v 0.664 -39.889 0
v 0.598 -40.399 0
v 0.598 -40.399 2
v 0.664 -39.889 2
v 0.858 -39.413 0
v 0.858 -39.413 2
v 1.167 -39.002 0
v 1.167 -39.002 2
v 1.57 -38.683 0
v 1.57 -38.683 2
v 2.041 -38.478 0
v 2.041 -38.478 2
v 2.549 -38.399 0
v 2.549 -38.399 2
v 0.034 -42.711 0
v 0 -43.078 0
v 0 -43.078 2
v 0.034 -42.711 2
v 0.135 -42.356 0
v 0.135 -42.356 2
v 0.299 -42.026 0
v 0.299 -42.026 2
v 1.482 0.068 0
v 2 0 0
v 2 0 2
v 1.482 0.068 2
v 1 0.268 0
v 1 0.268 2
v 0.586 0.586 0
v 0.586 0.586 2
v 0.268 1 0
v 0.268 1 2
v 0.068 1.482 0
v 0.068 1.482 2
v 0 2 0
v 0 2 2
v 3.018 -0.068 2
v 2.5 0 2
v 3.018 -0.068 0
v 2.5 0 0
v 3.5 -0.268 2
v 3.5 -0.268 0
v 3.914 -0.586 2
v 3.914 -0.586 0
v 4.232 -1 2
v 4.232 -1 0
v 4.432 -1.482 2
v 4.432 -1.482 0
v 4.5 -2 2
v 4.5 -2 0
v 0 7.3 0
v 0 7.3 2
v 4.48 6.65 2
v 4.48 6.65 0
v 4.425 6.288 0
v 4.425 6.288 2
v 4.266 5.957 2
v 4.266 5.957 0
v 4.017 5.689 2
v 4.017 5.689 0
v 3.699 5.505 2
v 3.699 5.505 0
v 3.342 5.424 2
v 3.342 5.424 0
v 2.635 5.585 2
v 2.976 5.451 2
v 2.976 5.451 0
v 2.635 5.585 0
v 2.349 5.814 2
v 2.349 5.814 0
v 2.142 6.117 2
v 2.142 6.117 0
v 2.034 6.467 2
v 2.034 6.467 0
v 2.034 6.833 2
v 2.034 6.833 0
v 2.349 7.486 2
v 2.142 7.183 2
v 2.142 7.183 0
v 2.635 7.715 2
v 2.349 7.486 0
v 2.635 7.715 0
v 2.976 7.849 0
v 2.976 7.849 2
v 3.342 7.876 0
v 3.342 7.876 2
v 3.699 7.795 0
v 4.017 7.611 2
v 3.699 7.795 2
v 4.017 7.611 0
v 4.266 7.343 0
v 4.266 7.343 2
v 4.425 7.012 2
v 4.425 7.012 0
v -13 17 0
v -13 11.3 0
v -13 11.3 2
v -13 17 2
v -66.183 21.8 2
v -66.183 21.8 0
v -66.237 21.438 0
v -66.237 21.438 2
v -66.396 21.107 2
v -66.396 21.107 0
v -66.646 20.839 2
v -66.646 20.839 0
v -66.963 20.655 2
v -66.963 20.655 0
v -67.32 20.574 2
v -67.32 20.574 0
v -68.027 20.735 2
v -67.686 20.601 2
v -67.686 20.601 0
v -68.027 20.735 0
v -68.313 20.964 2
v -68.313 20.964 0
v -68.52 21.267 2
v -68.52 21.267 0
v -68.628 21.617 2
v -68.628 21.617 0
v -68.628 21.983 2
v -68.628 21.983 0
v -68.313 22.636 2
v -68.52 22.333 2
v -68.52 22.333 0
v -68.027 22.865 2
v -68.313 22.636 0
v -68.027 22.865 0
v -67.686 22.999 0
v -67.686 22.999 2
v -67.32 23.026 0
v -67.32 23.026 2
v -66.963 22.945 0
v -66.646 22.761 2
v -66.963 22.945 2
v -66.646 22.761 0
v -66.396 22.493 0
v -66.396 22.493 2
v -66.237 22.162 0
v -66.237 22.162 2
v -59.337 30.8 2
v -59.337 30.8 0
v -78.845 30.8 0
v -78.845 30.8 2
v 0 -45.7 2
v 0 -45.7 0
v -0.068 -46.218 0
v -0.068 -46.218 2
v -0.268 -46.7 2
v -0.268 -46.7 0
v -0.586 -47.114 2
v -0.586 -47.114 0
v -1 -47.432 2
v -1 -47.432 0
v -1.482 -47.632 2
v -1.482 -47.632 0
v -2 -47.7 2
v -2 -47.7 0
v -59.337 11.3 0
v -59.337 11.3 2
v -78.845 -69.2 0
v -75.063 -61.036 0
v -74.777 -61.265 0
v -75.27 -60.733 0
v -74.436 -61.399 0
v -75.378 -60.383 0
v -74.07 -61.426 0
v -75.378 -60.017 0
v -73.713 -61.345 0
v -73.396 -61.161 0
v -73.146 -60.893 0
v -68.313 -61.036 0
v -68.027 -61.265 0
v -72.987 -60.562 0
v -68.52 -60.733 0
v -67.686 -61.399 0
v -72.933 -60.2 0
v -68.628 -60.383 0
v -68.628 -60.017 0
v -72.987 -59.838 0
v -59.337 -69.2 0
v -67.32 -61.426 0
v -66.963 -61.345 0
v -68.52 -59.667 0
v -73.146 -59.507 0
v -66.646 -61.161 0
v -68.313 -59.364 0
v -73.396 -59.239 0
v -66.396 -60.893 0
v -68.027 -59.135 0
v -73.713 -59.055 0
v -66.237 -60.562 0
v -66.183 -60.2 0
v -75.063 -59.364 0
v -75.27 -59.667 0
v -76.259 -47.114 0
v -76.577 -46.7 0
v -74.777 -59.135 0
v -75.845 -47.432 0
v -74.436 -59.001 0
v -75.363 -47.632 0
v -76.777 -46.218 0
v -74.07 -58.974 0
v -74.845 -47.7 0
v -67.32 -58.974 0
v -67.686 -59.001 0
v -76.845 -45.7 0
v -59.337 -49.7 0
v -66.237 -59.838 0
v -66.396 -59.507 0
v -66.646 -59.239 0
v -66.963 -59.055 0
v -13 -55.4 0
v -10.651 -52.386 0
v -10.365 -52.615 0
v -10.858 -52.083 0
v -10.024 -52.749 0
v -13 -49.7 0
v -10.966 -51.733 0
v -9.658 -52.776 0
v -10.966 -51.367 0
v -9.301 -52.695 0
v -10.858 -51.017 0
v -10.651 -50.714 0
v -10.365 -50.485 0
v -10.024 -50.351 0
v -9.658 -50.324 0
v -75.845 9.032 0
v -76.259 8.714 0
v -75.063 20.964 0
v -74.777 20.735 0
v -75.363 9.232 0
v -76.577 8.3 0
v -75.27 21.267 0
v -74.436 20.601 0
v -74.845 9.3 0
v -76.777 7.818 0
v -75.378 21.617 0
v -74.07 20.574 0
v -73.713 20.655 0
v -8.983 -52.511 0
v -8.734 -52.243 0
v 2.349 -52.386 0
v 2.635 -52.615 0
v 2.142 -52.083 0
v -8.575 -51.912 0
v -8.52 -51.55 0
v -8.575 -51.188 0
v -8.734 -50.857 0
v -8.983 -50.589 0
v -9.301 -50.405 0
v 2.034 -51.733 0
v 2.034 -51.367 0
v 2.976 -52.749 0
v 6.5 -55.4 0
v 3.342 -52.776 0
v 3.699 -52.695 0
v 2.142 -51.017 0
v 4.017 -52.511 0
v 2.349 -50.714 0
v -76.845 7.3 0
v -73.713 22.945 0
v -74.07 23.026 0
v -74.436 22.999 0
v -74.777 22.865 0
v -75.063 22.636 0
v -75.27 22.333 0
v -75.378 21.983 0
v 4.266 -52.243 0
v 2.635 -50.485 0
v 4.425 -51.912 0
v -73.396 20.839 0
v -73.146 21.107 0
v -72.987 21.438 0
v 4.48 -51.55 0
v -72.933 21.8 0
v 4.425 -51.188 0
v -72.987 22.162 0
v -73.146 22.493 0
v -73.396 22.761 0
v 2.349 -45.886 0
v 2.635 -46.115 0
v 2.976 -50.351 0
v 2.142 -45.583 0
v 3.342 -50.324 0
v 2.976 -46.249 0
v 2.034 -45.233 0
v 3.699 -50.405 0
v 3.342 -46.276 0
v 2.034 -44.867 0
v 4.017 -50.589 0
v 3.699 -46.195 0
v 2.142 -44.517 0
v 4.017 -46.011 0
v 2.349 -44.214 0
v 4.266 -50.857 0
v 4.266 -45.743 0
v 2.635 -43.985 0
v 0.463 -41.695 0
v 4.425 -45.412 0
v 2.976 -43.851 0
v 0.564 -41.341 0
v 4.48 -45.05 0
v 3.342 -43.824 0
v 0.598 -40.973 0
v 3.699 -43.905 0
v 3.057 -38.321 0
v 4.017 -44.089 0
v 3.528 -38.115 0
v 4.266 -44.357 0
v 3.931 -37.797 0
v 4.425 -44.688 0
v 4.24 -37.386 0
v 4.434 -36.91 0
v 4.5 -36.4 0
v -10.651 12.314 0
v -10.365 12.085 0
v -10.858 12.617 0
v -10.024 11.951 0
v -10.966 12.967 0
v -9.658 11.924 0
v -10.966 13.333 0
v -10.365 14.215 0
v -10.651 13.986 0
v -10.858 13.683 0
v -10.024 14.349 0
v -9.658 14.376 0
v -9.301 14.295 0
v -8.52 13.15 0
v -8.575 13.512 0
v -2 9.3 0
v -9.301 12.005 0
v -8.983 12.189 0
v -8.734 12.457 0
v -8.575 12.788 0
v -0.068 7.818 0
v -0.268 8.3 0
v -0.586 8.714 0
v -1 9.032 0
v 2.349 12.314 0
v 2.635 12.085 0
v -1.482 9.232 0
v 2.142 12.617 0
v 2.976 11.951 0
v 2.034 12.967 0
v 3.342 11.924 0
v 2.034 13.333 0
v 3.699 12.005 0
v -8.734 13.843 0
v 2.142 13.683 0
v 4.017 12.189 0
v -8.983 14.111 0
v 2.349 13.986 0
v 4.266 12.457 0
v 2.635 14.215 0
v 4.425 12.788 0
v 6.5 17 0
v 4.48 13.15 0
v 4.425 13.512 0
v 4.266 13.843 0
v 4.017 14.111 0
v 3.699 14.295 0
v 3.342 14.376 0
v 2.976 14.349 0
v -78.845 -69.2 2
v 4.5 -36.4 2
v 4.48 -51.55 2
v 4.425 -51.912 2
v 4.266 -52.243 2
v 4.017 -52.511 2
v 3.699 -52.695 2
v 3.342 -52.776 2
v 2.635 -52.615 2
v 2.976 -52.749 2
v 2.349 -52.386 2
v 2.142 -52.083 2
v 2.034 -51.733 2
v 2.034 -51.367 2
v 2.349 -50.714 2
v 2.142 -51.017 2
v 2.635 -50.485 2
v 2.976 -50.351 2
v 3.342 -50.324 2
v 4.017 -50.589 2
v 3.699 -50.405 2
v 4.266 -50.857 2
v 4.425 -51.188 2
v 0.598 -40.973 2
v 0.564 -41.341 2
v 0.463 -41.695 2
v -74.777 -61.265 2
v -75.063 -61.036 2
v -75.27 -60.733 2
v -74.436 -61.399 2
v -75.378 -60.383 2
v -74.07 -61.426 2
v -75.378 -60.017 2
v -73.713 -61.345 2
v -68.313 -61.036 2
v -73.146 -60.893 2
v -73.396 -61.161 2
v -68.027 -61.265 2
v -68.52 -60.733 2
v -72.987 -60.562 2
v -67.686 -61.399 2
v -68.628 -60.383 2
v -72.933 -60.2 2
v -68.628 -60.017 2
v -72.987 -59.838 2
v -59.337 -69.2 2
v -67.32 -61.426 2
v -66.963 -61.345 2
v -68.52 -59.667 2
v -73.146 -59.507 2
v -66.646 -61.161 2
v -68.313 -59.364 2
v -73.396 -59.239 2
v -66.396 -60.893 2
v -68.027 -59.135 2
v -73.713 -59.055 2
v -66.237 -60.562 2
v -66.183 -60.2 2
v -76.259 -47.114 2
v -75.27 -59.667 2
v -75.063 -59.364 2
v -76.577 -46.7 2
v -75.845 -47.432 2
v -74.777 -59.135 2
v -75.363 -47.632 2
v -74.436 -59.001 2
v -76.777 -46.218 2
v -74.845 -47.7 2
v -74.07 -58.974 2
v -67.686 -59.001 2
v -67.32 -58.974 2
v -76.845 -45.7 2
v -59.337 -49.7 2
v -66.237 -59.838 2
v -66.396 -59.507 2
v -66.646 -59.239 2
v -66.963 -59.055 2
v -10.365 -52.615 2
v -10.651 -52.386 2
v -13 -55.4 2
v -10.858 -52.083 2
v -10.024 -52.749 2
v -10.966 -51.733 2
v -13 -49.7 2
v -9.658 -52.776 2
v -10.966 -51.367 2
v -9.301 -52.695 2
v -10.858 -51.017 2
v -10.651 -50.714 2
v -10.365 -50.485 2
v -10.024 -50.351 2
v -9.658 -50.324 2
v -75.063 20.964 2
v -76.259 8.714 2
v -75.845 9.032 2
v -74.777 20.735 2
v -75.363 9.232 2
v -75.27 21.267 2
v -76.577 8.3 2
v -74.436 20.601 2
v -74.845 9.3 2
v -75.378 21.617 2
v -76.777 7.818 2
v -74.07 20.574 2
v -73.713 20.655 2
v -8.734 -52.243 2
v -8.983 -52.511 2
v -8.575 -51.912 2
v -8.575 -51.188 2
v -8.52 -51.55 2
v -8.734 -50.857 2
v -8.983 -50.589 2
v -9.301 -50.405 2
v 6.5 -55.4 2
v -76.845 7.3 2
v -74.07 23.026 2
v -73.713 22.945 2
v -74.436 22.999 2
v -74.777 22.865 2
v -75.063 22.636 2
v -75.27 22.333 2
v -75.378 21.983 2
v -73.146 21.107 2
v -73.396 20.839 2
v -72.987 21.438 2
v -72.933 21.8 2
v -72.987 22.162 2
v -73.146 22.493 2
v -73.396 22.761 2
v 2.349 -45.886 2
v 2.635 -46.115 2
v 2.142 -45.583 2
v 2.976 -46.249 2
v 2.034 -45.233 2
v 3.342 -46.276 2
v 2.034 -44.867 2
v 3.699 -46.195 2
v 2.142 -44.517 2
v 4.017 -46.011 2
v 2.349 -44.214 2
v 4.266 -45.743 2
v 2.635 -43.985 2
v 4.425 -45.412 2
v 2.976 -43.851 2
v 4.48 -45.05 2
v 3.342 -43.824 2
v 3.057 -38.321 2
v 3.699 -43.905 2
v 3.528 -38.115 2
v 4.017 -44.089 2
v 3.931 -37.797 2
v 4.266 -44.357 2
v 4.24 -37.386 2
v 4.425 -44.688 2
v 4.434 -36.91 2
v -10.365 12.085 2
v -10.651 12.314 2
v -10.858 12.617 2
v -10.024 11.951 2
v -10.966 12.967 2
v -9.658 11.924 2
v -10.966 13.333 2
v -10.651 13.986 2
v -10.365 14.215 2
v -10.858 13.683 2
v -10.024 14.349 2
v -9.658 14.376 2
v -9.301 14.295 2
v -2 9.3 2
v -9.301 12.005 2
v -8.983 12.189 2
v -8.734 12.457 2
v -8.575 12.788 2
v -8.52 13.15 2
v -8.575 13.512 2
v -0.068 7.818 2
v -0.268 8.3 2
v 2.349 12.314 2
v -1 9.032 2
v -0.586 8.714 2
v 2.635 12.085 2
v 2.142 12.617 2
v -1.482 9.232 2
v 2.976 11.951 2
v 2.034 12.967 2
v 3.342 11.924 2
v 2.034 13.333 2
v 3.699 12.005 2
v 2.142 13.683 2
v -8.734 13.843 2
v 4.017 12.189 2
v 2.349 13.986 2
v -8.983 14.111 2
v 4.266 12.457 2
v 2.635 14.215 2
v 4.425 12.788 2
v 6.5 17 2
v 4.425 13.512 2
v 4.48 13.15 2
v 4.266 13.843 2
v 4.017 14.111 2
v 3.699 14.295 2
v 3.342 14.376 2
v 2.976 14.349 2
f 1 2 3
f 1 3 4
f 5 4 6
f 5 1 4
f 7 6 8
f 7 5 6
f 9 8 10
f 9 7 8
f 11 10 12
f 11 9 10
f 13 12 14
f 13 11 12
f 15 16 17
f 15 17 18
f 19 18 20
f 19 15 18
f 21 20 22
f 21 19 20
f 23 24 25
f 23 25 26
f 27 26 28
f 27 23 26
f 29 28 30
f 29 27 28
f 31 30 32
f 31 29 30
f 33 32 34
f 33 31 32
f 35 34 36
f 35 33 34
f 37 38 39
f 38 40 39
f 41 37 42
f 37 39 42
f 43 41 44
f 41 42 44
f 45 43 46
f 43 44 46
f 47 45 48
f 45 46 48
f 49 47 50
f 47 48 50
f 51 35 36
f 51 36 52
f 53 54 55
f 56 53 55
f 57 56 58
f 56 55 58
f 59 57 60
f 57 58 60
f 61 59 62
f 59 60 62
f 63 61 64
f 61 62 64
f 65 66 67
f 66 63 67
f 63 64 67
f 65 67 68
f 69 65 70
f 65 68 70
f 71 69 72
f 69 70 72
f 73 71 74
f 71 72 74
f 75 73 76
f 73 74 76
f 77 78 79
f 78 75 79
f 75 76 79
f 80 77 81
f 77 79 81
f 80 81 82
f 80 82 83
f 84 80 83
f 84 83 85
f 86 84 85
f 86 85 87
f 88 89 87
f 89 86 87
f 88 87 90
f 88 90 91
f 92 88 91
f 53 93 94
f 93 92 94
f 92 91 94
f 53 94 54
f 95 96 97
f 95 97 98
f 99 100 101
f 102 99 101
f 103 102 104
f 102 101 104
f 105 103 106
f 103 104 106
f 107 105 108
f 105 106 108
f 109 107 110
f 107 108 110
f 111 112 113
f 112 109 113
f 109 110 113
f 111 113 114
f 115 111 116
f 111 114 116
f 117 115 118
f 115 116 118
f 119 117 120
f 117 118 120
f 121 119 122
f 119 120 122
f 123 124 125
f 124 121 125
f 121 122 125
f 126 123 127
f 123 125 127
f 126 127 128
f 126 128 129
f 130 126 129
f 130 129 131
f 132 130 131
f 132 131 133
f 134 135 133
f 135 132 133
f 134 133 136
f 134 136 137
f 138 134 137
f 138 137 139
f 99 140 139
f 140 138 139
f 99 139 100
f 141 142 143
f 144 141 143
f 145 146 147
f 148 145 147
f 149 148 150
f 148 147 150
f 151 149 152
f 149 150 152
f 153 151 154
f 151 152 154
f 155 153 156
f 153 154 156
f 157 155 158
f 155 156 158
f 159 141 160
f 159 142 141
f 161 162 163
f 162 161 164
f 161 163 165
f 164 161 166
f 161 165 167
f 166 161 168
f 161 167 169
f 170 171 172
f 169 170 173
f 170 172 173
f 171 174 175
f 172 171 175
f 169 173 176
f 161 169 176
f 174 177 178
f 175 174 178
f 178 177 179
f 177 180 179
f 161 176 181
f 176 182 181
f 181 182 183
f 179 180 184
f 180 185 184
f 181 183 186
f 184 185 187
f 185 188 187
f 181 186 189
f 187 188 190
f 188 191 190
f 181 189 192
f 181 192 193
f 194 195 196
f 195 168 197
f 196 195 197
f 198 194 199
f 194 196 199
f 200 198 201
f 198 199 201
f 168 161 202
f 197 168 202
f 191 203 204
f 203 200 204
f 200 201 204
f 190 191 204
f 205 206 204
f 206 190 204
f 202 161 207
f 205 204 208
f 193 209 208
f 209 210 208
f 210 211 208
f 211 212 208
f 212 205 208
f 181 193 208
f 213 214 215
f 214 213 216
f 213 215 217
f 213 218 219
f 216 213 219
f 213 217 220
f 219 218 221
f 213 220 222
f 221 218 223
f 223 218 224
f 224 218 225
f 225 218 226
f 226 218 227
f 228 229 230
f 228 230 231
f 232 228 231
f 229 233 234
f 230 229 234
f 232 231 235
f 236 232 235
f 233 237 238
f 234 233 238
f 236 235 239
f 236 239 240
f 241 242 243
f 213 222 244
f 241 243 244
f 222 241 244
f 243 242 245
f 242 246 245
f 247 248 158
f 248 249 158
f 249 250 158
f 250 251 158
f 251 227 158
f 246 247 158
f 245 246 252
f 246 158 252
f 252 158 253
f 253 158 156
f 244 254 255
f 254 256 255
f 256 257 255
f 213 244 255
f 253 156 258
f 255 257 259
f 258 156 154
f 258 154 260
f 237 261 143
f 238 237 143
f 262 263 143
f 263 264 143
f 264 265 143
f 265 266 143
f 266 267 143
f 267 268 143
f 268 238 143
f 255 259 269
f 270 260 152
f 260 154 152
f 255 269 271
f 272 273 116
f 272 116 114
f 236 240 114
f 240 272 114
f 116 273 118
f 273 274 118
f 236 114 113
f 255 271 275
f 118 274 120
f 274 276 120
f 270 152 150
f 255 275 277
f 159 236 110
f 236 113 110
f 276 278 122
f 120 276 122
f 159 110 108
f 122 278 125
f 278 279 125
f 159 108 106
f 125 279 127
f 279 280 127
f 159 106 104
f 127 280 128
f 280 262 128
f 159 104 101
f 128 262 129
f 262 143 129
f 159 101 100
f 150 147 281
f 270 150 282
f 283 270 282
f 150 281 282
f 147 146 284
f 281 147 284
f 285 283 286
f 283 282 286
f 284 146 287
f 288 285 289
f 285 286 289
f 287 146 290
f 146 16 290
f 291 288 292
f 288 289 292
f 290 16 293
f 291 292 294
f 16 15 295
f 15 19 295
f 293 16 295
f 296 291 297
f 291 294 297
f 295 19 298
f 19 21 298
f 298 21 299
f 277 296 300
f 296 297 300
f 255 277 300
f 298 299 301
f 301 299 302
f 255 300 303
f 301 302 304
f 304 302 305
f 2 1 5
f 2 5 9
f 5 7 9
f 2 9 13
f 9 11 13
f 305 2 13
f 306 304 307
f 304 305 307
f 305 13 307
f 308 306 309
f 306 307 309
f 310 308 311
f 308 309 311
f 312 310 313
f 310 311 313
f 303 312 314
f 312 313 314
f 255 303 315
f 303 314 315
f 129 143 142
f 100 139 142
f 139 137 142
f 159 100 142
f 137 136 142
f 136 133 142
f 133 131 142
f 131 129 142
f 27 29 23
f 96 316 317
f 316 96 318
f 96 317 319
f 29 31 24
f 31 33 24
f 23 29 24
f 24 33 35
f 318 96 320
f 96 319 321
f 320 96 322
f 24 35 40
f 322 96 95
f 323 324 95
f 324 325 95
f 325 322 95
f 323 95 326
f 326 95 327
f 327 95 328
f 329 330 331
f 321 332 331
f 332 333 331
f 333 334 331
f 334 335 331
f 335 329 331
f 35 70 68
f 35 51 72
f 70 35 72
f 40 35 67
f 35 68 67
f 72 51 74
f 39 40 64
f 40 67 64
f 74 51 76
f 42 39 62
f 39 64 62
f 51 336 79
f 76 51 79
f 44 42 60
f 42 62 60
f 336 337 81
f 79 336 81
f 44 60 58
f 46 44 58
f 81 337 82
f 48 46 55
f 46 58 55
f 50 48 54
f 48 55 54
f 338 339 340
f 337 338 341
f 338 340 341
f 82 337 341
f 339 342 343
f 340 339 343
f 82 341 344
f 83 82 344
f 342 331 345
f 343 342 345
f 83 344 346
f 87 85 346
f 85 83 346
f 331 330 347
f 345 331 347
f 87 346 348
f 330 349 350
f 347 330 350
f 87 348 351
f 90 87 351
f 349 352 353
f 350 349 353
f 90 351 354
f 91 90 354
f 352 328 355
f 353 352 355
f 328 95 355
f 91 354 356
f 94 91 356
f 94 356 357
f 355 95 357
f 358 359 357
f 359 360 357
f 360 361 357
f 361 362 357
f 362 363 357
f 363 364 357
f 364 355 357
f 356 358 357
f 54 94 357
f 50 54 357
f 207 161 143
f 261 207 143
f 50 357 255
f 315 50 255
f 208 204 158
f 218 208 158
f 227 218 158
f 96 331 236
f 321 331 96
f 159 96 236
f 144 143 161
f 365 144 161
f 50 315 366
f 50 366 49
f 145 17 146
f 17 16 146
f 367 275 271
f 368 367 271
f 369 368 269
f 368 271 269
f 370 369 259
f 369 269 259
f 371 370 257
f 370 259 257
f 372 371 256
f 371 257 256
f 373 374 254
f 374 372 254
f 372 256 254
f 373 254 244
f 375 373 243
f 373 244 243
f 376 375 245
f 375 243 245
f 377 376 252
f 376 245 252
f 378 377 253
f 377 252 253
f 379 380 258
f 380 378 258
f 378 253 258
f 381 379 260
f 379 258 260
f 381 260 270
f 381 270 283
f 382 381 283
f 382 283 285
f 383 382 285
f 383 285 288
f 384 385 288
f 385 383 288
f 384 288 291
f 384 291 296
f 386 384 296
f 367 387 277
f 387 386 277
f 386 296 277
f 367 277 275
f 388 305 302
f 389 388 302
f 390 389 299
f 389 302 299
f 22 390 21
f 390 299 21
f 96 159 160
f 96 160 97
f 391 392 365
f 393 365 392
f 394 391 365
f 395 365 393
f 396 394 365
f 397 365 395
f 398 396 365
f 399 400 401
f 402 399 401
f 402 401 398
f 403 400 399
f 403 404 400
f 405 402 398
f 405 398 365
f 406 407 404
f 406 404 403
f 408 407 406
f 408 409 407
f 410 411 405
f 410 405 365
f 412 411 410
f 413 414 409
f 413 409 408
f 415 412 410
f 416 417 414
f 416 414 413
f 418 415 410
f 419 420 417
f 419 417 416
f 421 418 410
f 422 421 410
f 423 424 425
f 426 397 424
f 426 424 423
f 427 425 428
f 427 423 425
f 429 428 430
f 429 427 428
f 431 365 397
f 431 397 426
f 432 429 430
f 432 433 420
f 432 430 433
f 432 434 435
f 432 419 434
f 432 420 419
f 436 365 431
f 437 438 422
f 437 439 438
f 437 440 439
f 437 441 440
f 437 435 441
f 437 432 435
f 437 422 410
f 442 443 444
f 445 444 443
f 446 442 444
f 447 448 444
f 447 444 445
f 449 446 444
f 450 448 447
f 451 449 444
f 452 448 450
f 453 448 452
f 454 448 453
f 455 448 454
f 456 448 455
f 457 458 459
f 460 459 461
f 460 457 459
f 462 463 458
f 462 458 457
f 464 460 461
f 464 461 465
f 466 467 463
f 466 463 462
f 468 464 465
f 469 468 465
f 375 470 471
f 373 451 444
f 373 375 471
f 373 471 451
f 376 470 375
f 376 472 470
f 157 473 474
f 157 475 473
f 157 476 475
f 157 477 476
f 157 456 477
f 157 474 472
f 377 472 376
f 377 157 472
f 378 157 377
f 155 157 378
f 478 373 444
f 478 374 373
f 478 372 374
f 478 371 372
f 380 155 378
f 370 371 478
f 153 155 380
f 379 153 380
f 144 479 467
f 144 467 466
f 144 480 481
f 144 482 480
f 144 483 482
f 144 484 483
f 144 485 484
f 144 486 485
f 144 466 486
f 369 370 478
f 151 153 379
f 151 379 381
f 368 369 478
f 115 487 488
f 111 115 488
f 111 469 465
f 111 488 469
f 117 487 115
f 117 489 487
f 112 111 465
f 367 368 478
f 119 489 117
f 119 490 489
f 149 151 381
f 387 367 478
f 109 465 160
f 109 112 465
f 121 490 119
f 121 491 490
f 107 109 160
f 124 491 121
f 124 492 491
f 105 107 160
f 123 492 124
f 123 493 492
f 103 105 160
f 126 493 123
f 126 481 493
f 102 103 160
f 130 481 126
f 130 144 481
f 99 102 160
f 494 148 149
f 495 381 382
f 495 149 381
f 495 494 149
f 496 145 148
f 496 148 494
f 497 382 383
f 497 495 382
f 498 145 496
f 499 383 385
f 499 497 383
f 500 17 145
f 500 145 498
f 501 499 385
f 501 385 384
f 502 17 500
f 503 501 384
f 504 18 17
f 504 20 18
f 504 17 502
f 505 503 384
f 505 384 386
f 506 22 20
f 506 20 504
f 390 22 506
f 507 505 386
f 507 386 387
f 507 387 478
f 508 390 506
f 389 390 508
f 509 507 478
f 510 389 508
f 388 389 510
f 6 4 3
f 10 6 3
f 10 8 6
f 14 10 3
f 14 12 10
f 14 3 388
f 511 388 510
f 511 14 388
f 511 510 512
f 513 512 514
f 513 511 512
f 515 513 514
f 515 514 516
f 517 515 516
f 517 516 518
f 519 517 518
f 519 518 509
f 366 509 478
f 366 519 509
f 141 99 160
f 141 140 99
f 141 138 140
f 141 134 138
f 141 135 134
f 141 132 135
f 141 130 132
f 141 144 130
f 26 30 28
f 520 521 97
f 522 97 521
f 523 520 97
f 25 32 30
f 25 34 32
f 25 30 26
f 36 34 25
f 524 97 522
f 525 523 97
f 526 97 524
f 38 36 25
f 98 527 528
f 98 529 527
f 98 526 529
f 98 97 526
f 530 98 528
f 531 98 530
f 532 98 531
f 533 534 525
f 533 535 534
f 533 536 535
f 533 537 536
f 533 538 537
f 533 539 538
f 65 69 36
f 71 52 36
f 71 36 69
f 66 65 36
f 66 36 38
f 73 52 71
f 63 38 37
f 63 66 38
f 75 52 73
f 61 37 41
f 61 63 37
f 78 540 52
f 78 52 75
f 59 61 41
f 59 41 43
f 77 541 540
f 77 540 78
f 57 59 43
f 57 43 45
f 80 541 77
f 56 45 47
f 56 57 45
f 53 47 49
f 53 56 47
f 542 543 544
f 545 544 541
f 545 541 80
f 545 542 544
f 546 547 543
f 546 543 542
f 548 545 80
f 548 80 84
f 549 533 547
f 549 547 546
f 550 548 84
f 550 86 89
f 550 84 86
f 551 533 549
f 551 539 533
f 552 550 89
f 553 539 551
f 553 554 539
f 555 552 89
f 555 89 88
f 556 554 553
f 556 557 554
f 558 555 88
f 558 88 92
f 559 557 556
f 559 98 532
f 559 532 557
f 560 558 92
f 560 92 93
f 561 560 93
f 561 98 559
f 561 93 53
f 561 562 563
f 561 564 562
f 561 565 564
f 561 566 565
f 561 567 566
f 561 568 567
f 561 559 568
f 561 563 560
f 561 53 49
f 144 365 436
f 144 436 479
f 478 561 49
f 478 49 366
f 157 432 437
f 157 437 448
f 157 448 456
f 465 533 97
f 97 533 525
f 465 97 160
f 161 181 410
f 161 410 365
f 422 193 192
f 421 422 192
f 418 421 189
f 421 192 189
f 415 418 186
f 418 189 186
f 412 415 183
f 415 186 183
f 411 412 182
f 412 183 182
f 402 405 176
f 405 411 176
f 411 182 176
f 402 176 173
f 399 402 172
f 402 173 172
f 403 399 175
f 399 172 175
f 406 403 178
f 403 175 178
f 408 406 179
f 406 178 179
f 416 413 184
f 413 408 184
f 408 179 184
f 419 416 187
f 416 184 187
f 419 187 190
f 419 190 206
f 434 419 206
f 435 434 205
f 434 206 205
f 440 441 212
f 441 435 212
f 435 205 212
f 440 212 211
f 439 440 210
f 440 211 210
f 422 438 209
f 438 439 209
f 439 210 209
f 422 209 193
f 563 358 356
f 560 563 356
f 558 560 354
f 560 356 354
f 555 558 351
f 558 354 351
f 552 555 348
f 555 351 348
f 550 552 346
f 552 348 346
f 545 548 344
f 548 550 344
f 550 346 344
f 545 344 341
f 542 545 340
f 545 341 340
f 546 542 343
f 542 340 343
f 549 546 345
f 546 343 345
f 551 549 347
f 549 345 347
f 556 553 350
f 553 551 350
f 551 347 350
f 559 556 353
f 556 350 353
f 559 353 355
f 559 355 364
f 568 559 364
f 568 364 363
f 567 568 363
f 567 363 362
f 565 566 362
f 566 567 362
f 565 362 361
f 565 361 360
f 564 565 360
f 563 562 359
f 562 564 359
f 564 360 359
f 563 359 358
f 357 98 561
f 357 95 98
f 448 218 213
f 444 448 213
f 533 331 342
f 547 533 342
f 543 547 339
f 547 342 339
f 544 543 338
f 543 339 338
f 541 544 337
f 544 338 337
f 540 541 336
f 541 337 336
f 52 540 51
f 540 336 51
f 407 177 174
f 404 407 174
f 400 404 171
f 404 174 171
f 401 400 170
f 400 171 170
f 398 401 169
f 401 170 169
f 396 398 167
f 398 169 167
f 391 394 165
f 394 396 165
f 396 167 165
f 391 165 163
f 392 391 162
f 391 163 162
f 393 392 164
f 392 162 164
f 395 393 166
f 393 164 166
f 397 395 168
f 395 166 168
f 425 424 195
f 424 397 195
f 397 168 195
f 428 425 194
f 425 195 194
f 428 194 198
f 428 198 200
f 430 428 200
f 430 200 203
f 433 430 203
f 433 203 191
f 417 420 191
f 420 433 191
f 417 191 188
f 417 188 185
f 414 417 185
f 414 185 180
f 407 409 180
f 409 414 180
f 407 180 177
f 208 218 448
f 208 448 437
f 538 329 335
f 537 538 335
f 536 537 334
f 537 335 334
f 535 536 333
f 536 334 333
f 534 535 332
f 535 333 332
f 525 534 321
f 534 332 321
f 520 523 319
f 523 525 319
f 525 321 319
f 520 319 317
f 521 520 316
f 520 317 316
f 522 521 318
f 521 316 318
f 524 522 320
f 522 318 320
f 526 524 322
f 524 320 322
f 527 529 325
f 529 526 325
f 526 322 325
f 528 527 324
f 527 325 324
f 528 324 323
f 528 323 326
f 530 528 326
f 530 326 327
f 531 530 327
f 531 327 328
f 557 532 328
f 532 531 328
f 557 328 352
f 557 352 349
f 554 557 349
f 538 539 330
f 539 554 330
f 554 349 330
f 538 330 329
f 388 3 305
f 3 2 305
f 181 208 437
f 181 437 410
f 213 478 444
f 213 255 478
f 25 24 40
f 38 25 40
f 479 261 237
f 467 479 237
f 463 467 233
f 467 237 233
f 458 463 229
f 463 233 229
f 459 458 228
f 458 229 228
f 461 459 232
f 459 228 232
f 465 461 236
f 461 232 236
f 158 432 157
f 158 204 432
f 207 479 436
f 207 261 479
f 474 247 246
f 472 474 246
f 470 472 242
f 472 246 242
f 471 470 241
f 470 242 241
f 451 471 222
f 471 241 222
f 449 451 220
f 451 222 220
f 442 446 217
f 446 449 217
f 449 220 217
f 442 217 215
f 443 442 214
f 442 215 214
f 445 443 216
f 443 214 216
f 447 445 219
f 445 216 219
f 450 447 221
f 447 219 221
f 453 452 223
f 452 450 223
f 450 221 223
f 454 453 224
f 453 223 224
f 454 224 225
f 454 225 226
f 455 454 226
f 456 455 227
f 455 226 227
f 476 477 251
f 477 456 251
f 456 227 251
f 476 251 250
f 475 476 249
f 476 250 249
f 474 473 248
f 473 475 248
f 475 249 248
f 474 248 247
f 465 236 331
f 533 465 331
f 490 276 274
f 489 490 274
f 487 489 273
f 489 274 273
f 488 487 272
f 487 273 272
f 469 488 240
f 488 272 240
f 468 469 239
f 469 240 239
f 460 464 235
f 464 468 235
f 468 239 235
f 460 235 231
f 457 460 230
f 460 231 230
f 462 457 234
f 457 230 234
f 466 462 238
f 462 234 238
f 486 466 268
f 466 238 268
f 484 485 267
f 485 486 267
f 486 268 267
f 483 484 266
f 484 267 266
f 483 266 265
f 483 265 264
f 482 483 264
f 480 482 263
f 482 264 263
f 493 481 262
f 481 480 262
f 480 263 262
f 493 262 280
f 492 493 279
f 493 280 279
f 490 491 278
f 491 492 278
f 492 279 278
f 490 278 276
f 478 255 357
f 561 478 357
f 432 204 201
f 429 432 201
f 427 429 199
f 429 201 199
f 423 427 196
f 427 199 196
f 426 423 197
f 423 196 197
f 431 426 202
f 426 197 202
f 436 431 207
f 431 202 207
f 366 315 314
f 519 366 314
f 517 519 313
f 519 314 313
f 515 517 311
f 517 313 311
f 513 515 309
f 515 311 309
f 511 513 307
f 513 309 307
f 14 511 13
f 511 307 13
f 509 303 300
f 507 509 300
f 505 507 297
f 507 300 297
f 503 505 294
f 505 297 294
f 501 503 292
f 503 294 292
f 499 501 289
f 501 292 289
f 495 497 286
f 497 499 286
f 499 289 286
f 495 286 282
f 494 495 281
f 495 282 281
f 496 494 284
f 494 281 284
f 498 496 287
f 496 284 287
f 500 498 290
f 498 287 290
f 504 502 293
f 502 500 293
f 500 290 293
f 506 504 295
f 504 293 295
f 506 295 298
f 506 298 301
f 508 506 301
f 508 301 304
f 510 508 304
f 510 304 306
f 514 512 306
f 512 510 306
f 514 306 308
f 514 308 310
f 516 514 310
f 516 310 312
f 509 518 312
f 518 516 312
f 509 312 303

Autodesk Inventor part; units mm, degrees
ref_plane "YZ Plane" through (0, 0, 0) normal (1, 0, 0) x (0, 1, 0)
ref_plane "XZ Plane" through (0, 0, 0) normal (0, 1, 0) x (-1, 0, 0)
ref_plane "XY Plane" through (0, 0, 0) normal (0, 0, 1) x (1, 0, 0)
sketch "Sketch1" plane through (0, 0, 0) normal (0, 0, 1) x (1, 0, 0)
  circle A0 centre (3.25, 6.65) radius 1.2295 projected
  line L0 (0, 0) -> (6.5, 0) projected
  line L1 (6.5, 0) -> (6.5, 9.3) projected
  line L2 (6.5, 9.3) -> (0, 9.3) projected
  line L3 (0, 0) -> (0, 9.3) projected
  circle A1 centre (3.25, 13.15) radius 1.2295 projected
  line L4 (0, 9.3) -> (6.5, 9.3) projected
  line L5 (6.5, 9.3) -> (6.5, 17) projected
  line L6 (0, 17) -> (6.5, 17) projected
  line L7 (0, 9.3) -> (0, 17) projected
  circle A2 centre (3.25, -45.05) radius 1.2295 projected
  line L8 (0.5983, -42.4) -> (0, -42.4) projected
  line L9 (0, -42.4) -> (0, -47.7) projected
  line L10 (0, -47.7) -> (6.5, -47.7) projected
  line L11 (6.5, -38.4) -> (6.5, -47.7) projected
  line L12 (0.5983, -38.4) -> (6.5, -38.4) projected
  line L13 (0.5983, -38.4) -> (0.5983, -42.4) projected
  circle A3 centre (3.25, -51.55) radius 1.2295 projected
  line L14 (0, -47.7) -> (6.5, -47.7) projected
  line L15 (0, -47.7) -> (0, -55.4) projected
  line L16 (6.5, -55.4) -> (0, -55.4) projected
  line L17 (6.5, -47.7) -> (6.5, -55.4) projected
  circle A4 centre (-9.75, -51.55) radius 1.2295 projected
  line L18 (-41.3371, -47.7) -> (-6.5, -47.7) projected
  line L19 (-41.3371, -47.7) -> (-41.3371, -49.7) projected
  line L20 (-13, -49.7) -> (-41.3371, -49.7) projected
  line L21 (-13, -49.7) -> (-13, -55.4) projected
  line L22 (-6.5, -55.4) -> (-13, -55.4) projected
  line L23 (-6.5, -47.7) -> (-6.5, -55.4) projected
  circle A5 centre (-9.75, 13.15) radius 1.2295 projected
  line L24 (-41.3371, 11.3) -> (-13, 11.3) projected
  line L25 (-41.3371, 9.3) -> (-41.3371, 11.3) projected
  line L26 (-41.3371, 9.3) -> (-6.5, 9.3) projected
  line L27 (-6.5, 9.3) -> (-6.5, 17) projected
  line L28 (-13, 17) -> (-6.5, 17) projected
  line L29 (-13, 11.3) -> (-13, 17) projected
  arc A6 (-64.7971, 16.2257) -> (-64.1621, 16.7072) centre (-64.6621, 16.7072) ccw projected
  line L30 (-64.1621, 16.7072) -> (-64.1621, 23.8) projected
  arc A7 (-64.1621, 23.8) -> (-67.1621, 26.8) centre (-67.1621, 23.8) ccw projected
  line L31 (-67.1621, 26.8) -> (-70.1621, 26.8) projected
  line L32 (-70.1621, 26.8) -> (-70.1621, 29.3) projected
  line L33 (-70.1621, 29.3) -> (-59.3371, 29.3) projected
  line L34 (-59.3371, 29.3) -> (-59.3371, 30.8) projected
  line L35 (-59.3371, 30.8) -> (-78.8451, 30.8) projected
  line L36 (-78.8451, 16.3) -> (-78.8451, 30.8) projected
  line L37 (-65.3371, 16.3) -> (-78.8451, 16.3) projected
  arc A8 (-64.7971, 16.2257) -> (-65.3371, 16.3) centre (-65.3371, 14.3) ccw projected
  circle A9 centre (-67.4121, 21.8) radius 1.2295 projected
  circle A10 centre (-74.1621, 21.8) radius 1.2295 projected
  circle A11 centre (-67.4121, -60.2) radius 1.2295 projected
  circle A12 centre (-74.1621, -60.2) radius 1.2295 projected
  arc A13 (-64.1621, -55.1072) -> (-64.7971, -54.6257) centre (-64.6621, -55.1072) ccw projected
  arc A14 (-65.3371, -54.7) -> (-64.7971, -54.6257) centre (-65.3371, -52.7) ccw projected
  line L38 (-65.3371, -54.7) -> (-78.8451, -54.7) projected
  line L39 (-78.8451, -54.7) -> (-78.8451, -69.2) projected
  line L40 (-59.3371, -69.2) -> (-78.8451, -69.2) projected
  line L41 (-59.3371, -67.7) -> (-59.3371, -69.2) projected
  line L42 (-59.3371, -67.7) -> (-70.1621, -67.7) projected
  line L43 (-70.1621, -67.7) -> (-70.1621, -65.2) projected
  line L44 (-70.1621, -65.2) -> (-67.1621, -65.2) projected
  arc A15 (-67.1621, -65.2) -> (-64.1621, -62.2) centre (-67.1621, -62.2) ccw projected
  line L45 (-64.1621, -62.2) -> (-64.1621, -55.1072) projected
  line L46 (-59.3371, 30.8) -> (-59.3371, 11.3)
  line L47 (-59.3371, 11.3) -> (-41.3371, 11.3)
  line L48 (-41.3371, 9.3) -> (-76.8451, 9.3)
  line L49 (-78.8451, 16.3) -> (-78.8451, -54.7)
  line L50 (-76.8451, 9.3) -> (-76.8451, -47.7)
  line L51 (-76.8451, -47.7) -> (-41.3371, -47.7)
  line L52 (-41.3371, -49.7) -> (-59.3371, -49.7)
  line L53 (-59.3371, -49.7) -> (-59.3371, -67.7)
  line L54 (-6.5, 17) -> (0, 17)
  line L55 (-6.5, 9.3) -> (0, 9.3)
  line L56 (-6.5, -47.7) -> (0, -47.7)
  line L57 (-6.5, -55.4) -> (0, -55.4)
  line L58 (6.5, 0) -> (6.5, -38.4)
  line L59 (4.5, -38.4) -> (4.5, 0)
  dimension "d0" = 2
  dimension "d1" = 2
extrude "Extrusion1" add sketch "Sketch1" along normal blind 2 contours L3 L2 L1 L0 | L0 L58 L12 L59 | L7 L6 L5 L2 | L55 L27 L54 L7 | L12 L11 L10 L9 L8 L13 | L26 L25 L24 L29 L28 L27 | L48 L50 L51 L19 L52 L53 L42 L43 L44 A15 L45 A13 A14 L38 L49 L37 A8 A6 L30 A7 L31 L32 L33 L46 L47 L25 | L17 L16 L15 L10 | L15 L57 L23 L56 | L23 L22 L21 L20 L19 L18 | L33 L32 L31 A7 L30 A6 A8 L37 L36 L35 L34 | L41 L40 L39 L38 A14 A13 L45 A15 L44 L43 L42
fillet "Fillet1" radius 2 10 edges at (-76.8451, 9.3, 1) (-76.8451, -47.7, 1) (0.5983, -42.4, 1) (0, -42.4, 1) (0.5983, -38.4, 1) (4.5, -38.4, 1) (0, -47.7, 1) (0, 9.3, 1) (0, 0, 1) (4.5, 0, 1)
properties part number "CeilUphold"
